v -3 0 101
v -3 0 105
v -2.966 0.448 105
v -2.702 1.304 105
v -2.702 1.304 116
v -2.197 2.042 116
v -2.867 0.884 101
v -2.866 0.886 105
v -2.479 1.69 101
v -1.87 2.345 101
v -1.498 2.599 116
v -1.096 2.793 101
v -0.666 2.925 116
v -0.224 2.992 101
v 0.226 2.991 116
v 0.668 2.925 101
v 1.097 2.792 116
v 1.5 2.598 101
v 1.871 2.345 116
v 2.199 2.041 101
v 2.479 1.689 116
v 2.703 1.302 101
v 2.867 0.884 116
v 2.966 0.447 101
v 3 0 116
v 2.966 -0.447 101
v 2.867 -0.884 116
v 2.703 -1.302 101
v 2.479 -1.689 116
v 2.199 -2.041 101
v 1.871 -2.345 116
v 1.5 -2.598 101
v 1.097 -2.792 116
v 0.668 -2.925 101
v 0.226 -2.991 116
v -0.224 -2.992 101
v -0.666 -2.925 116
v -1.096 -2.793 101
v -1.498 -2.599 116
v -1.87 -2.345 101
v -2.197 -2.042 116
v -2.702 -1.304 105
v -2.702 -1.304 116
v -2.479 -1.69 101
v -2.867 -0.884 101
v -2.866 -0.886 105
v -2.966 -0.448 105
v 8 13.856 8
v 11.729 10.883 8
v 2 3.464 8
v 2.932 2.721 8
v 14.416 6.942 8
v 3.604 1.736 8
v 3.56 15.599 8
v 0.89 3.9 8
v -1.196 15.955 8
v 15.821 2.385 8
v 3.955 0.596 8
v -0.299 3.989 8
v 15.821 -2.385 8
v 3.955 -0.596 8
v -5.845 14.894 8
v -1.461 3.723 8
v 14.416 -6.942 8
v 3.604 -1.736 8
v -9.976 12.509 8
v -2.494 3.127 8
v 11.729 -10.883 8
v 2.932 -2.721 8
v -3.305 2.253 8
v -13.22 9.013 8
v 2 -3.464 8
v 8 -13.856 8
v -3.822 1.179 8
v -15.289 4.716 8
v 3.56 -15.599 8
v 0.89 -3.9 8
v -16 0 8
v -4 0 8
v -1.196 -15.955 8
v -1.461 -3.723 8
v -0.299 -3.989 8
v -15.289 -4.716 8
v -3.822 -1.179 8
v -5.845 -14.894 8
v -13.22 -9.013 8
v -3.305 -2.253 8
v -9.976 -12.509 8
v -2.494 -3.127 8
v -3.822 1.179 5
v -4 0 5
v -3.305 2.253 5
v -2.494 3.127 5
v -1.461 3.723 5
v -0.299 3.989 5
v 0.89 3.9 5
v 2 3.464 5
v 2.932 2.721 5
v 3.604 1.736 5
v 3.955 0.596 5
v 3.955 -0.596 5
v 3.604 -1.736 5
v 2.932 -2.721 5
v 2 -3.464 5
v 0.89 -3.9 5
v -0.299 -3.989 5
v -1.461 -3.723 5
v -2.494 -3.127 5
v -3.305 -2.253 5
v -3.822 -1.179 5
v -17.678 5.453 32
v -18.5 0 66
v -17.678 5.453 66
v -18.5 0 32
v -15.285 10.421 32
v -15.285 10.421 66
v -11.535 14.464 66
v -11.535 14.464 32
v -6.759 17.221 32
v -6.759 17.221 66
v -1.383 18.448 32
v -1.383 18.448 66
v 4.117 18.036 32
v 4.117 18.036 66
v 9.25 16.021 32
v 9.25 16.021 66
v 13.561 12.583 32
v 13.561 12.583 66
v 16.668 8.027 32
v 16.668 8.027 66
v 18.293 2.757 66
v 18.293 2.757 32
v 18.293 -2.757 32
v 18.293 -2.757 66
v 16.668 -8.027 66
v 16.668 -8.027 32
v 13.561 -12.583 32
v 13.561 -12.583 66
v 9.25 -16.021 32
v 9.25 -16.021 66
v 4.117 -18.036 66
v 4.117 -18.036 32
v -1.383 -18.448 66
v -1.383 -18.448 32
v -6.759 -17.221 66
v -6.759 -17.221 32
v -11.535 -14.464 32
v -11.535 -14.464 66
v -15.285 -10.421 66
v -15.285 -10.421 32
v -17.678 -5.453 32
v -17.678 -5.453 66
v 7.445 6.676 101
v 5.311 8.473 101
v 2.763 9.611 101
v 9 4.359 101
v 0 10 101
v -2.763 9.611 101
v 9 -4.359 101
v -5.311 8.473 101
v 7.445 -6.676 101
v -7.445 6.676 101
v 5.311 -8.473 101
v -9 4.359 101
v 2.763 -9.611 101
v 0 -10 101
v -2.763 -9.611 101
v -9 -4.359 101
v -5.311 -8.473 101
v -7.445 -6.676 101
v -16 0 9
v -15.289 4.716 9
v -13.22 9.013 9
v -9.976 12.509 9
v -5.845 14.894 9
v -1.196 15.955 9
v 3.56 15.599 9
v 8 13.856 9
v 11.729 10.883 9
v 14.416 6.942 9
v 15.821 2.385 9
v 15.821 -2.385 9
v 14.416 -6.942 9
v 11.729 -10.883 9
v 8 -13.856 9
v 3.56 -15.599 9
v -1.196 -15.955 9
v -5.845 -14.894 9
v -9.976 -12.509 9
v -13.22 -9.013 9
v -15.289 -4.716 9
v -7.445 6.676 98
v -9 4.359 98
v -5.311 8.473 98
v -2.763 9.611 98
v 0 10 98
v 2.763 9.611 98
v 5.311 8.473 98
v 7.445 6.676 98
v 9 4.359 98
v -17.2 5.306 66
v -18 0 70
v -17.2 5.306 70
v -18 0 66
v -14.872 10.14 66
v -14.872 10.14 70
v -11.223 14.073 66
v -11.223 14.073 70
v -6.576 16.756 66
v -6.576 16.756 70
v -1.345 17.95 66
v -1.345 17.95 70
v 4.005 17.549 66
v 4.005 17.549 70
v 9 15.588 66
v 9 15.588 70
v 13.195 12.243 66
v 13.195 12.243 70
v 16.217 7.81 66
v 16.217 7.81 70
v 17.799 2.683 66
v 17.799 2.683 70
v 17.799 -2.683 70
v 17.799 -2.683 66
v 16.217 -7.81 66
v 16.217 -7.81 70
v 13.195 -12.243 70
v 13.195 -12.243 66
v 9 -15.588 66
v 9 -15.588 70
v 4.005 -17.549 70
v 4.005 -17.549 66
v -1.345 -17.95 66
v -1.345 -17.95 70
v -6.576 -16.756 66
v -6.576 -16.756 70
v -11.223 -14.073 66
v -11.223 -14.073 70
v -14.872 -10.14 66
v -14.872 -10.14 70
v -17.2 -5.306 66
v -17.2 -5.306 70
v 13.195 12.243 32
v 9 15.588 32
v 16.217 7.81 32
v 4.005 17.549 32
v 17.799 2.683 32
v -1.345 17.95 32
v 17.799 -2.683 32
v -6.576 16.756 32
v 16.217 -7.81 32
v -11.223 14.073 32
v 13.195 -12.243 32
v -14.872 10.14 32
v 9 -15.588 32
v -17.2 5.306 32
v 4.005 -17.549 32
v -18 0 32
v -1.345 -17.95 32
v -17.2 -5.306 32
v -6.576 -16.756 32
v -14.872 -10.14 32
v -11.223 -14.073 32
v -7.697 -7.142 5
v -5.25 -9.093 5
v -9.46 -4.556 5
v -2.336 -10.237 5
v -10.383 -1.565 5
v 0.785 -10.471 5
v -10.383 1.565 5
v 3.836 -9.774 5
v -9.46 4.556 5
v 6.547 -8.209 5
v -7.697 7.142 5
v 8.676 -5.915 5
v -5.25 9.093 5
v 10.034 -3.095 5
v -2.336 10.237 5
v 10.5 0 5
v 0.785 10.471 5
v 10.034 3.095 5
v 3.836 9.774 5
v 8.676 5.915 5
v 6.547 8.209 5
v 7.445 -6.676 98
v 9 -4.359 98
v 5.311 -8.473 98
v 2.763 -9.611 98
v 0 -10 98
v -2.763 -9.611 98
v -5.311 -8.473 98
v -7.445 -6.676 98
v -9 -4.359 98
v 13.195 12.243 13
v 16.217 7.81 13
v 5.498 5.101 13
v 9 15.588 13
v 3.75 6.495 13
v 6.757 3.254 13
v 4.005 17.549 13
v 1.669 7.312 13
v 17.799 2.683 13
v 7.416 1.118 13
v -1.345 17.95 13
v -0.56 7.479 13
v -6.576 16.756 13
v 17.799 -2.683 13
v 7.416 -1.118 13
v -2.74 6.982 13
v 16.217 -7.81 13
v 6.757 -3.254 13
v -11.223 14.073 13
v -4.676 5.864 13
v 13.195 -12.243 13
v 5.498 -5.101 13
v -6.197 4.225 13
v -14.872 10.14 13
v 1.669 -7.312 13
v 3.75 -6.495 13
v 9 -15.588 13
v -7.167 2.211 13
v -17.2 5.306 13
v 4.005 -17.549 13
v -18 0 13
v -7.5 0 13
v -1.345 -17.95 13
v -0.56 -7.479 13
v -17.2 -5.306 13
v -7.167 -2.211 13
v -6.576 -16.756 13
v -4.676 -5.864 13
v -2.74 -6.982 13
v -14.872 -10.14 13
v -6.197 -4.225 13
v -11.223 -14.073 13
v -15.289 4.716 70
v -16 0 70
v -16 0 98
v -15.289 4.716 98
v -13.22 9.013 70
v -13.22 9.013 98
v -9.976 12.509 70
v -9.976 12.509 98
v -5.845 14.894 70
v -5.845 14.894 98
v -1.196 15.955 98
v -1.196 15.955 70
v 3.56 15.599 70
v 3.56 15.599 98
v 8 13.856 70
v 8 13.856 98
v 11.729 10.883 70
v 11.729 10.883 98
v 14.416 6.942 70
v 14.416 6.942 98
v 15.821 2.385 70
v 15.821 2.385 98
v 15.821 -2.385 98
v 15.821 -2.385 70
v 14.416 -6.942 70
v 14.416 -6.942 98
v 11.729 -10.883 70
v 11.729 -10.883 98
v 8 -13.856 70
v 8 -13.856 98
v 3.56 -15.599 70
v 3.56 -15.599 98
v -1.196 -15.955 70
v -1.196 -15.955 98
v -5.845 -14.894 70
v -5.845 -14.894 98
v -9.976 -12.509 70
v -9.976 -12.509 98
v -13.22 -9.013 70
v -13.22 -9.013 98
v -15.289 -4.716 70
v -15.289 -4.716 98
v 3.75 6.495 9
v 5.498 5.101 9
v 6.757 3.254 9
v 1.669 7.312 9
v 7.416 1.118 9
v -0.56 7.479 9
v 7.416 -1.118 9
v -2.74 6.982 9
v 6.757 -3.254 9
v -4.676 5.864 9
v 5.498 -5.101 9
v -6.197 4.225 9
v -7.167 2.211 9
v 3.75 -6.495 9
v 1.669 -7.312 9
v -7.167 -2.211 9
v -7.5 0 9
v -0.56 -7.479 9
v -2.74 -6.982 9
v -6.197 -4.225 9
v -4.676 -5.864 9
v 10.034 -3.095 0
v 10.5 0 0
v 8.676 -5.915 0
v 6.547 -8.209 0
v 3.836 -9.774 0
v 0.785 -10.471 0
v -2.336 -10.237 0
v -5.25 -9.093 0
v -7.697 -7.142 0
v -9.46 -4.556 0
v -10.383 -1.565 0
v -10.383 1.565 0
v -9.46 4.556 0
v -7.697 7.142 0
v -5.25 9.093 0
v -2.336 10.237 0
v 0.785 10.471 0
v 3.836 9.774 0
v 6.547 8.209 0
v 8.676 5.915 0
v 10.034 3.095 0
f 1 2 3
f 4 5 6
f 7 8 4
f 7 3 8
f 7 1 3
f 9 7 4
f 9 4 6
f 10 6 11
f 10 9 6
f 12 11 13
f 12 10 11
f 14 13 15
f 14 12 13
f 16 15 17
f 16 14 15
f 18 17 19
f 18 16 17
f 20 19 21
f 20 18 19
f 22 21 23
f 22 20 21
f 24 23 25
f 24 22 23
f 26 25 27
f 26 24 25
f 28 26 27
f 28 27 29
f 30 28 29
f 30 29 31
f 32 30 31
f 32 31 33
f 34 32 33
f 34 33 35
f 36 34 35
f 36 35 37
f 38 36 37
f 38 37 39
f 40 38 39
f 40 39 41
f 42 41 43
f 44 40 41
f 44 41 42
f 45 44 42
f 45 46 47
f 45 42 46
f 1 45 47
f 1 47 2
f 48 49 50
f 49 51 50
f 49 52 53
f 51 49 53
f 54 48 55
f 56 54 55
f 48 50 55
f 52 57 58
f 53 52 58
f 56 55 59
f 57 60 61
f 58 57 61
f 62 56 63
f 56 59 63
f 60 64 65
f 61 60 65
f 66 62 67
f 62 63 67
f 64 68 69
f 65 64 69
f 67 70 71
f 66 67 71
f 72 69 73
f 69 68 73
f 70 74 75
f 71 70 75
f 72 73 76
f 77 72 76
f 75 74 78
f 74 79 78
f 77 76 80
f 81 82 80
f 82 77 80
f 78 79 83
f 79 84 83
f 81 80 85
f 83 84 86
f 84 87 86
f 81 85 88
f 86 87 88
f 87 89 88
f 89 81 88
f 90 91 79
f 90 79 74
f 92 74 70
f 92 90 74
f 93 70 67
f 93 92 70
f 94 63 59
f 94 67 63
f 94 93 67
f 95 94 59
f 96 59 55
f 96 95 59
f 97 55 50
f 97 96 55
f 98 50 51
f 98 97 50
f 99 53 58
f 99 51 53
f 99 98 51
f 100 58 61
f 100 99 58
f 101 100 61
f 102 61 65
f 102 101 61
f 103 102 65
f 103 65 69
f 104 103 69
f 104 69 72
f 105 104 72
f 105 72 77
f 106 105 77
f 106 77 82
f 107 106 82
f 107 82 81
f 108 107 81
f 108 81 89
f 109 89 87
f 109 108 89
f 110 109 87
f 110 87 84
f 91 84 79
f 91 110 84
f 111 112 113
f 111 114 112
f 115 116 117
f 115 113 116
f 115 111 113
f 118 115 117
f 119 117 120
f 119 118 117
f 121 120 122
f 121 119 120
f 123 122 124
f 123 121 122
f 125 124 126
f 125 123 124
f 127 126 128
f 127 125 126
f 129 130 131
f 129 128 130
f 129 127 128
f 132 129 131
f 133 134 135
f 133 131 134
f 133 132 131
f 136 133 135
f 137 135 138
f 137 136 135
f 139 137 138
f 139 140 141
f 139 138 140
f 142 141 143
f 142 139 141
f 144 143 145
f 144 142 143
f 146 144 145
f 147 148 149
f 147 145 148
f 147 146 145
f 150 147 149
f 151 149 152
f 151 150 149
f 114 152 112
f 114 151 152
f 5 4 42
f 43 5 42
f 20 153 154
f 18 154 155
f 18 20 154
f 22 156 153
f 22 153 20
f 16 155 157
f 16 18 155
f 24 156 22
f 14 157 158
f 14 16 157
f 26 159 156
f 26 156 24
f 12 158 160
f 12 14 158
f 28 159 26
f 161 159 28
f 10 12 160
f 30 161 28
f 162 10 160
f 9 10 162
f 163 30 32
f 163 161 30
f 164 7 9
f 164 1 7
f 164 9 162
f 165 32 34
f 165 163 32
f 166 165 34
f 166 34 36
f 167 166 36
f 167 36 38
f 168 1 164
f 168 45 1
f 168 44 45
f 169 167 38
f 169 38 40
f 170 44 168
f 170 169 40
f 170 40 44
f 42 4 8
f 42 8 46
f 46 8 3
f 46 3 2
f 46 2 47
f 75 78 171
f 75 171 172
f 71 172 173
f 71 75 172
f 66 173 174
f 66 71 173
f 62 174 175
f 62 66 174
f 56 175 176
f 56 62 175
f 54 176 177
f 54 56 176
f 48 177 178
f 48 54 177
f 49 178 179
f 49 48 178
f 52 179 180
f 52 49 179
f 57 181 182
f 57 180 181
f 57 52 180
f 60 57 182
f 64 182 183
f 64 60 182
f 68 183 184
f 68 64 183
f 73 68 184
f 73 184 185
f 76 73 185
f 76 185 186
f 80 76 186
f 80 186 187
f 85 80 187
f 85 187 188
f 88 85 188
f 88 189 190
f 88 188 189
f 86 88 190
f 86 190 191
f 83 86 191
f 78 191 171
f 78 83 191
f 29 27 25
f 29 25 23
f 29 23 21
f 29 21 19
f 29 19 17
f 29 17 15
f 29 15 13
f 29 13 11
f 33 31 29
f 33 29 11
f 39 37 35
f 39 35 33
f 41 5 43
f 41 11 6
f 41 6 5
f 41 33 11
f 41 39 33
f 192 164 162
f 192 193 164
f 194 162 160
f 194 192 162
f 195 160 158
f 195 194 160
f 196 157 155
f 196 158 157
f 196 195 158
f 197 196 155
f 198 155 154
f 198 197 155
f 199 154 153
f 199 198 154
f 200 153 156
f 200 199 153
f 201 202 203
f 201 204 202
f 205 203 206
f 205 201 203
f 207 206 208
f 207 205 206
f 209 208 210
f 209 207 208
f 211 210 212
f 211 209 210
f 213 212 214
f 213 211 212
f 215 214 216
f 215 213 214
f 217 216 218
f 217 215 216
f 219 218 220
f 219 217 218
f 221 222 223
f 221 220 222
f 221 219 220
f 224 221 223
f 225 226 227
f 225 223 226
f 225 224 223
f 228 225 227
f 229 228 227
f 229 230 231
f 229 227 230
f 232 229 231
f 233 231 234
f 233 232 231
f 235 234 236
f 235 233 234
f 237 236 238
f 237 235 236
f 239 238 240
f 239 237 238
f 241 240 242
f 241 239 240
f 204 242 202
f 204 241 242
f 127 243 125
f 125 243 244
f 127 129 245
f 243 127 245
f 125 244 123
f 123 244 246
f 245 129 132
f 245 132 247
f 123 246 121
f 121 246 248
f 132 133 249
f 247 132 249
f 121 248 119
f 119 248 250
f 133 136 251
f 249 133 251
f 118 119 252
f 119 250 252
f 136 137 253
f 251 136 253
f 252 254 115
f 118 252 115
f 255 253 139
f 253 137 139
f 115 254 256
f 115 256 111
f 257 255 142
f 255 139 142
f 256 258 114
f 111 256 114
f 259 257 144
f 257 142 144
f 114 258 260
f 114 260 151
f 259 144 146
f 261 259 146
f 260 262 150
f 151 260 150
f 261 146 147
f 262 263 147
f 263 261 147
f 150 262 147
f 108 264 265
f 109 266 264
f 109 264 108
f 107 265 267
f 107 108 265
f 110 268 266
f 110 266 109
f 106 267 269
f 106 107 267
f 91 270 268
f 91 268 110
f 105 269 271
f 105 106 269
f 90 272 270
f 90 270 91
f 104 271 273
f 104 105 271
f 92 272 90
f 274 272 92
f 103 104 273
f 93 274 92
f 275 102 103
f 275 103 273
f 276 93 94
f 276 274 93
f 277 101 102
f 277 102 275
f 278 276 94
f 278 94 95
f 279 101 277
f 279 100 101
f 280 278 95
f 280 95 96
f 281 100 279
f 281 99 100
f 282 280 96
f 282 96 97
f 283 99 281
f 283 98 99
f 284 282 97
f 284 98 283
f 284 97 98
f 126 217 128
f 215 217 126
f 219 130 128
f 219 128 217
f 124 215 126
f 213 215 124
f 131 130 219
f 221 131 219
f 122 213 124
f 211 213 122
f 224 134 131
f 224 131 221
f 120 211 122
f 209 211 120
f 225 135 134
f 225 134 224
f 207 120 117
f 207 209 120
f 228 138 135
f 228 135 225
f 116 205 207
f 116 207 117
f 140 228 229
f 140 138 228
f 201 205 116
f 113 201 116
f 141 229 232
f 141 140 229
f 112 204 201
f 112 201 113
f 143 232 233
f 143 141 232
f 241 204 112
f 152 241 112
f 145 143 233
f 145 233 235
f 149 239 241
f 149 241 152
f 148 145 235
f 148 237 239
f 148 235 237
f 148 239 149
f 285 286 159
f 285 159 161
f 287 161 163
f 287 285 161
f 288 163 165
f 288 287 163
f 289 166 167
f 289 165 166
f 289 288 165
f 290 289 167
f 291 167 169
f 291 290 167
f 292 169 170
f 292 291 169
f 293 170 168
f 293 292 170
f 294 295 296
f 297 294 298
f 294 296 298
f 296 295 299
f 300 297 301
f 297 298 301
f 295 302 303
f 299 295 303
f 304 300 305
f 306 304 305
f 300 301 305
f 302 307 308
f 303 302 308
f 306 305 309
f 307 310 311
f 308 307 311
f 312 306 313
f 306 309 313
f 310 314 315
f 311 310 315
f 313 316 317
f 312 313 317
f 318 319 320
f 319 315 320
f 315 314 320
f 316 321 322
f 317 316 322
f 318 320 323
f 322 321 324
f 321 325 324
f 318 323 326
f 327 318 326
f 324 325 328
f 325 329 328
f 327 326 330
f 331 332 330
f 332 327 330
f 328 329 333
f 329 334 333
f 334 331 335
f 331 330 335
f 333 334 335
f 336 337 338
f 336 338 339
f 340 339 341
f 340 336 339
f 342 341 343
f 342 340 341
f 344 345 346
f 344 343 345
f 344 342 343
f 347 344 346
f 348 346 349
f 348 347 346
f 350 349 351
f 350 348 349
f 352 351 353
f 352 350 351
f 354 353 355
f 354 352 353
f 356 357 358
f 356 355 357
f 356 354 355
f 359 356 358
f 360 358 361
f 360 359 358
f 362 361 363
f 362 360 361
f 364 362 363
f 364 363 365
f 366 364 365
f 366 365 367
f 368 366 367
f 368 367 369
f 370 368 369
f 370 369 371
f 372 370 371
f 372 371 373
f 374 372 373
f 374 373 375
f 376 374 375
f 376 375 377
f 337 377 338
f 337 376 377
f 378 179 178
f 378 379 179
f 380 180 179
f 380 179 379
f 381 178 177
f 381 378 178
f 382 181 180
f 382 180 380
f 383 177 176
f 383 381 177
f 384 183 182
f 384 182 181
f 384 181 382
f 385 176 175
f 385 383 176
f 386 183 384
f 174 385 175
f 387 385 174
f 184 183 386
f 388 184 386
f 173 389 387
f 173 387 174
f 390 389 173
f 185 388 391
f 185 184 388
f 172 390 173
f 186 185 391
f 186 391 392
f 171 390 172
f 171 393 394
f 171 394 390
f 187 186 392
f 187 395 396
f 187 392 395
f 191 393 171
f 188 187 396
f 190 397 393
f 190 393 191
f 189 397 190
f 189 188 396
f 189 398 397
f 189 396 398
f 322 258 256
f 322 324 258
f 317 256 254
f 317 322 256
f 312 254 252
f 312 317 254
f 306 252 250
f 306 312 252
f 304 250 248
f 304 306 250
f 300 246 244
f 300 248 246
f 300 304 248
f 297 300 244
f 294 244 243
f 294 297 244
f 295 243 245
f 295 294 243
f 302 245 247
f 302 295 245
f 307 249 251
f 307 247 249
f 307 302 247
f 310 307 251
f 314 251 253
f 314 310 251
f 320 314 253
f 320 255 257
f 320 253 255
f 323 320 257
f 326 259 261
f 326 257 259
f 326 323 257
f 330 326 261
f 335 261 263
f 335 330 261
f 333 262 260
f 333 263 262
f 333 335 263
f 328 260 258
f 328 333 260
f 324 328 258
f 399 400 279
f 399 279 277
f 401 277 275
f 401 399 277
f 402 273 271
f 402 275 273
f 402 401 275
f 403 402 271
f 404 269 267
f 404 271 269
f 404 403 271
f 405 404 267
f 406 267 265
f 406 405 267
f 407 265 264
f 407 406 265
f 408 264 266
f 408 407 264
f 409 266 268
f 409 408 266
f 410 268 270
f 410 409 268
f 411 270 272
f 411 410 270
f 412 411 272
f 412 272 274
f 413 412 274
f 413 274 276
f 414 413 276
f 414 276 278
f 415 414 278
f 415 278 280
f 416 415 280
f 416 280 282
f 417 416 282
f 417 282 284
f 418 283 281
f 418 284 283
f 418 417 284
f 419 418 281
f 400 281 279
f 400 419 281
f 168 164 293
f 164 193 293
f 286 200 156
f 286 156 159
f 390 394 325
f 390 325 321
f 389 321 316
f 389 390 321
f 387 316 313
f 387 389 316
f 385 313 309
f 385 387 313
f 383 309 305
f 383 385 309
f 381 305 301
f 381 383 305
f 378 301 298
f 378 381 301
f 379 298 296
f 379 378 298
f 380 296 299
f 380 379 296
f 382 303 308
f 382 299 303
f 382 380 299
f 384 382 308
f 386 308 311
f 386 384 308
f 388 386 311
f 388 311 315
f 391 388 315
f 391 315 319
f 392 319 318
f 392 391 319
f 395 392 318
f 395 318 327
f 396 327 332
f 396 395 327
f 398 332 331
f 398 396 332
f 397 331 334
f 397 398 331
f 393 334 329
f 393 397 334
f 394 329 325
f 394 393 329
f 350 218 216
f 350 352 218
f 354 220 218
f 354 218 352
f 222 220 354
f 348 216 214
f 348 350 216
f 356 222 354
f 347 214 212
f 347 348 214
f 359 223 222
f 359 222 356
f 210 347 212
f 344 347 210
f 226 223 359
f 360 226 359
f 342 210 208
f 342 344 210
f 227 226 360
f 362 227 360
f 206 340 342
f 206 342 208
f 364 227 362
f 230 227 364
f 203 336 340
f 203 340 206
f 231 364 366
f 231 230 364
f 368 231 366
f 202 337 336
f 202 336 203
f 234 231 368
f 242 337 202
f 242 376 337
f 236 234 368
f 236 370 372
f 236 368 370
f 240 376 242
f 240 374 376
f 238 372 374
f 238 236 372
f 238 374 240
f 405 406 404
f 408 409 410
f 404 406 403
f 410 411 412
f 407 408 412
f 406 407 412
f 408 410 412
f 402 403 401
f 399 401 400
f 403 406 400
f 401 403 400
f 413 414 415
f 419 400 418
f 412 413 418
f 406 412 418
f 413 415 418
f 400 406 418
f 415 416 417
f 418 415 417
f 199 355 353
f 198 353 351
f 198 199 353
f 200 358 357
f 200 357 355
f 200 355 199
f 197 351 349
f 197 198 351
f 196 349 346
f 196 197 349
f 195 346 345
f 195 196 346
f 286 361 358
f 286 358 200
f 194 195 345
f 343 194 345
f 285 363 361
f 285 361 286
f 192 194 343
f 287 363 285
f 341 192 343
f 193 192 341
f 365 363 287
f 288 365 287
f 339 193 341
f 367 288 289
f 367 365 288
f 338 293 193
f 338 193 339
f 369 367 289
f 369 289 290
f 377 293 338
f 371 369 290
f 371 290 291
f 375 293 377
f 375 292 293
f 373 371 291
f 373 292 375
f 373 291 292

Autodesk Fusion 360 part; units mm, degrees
sketch "Sketch1" plane through (0, 0, 0) normal (0, 0, 1) x (1, 0, 0)
  circle A0 centre (0, 0) radius 10.5
  dimension "d1" = 21
extrude "Extrude1" add sketch "Sketch1" along normal blind 5
sketch "Sketch2" plane through (0, 0, 5) normal (0, 0, 1) x (-1, 0, 0)
  circle A0 centre (0, 0) radius 10.5
  circle A1 centre (0, 0) radius 4
  dimension "d4" = 8
extrude "Extrude2" add sketch "Sketch2" along normal blind 3 contours A1
sketch "Sketch3" plane through (0, 0, 8) normal (0, 0, 1) x (-1, 0, 0)
  circle A0 centre (0, 0) radius 4
  circle A1 centre (0, 0) radius 16
  dimension "d7" = 32
extrude "Extrude3" add sketch "Sketch3" along normal blind 1 contours A0 | A1
sketch "Sketch4" plane through (0, 0, 9) normal (0, 0, 1) x (-1, 0, 0)
  circle A0 centre (0, 0) radius 16
  circle A1 centre (0, 0) radius 7.5
  dimension "d10" = 15
extrude "Extrude4" add sketch "Sketch4" along normal blind 4 contours A1
sketch "Sketch5" plane through (0, 0, 13) normal (0, 0, 1) x (-1, 0, 0)
  circle A0 centre (0, 0) radius 7.5
  circle A1 centre (0, 0) radius 18
  dimension "d13" = 36
extrude "Extrude5" add sketch "Sketch5" along normal blind 19 contours A0 | A1
sketch "Sketch6" plane through (0, 0, 32) normal (0, 0, 1) x (-1, 0, 0)
  circle A0 centre (0, 0) radius 18
  circle A1 centre (0, 0) radius 18.5
  dimension "d16" = 37
extrude "Extrude6" add sketch "Sketch6" along normal blind 34 contours A0 | A1
sketch "Sketch7" plane through (0, 0, 66) normal (0, 0, 1) x (-1, 0, 0)
  circle A0 centre (0, 0) radius 18.5
  circle A1 centre (0, 0) radius 18
  dimension "d19" = 36
extrude "Extrude7" add sketch "Sketch7" along normal blind 4 contours A1
sketch "Sketch8" plane through (0, 0, 70) normal (0, 0, 1) x (-1, 0, 0)
  circle A0 centre (0, 0) radius 18
  circle A1 centre (0, 0) radius 16
  dimension "d22" = 32
extrude "Extrude8" add sketch "Sketch8" along normal blind 28 contours A1
sketch "Sketch9" plane through (0, 0, 98) normal (0, 0, 1) x (-1, 0, 0)
  circle A0 centre (0, 0) radius 16
  line L0 (0, -10) -> (0, 10) construction
  line L1 (9, -4.3589) -> (9, 4.3589)
  line L2 (-9, -4.3589) -> (-9, 4.3589)
  arc A1 (9, 4.3589) -> (-9, 4.3589) centre (0, 0) ccw
  arc A2 (-9, -4.3589) -> (9, -4.3589) centre (0, 0) ccw
  dimension "d25" = 20
  dimension "d26" = 9
sketch "Sketch10" plane through (0, 0, 98) normal (0, 0, 1) x (-1, 0, 0)
extrude "Extrude9" add sketch "Sketch9" along normal blind 3 contours L1 L2 A1 A2
sketch "Sketch11" plane through (0, 0, 101) normal (0, 0, 1) x (-1, 0, 0)
  arc A0 (-9, -4.3589) -> (9, -4.3589) centre (0, 0) ccw
  line L0 (9, -4.3589) -> (9, 4.3589)
  arc A1 (9, 4.3589) -> (-9, 4.3589) centre (0, 0) ccw
  line L1 (-9, 4.3589) -> (-9, -4.3589)
  circle A2 centre (0, 0) radius 3
  dimension "d29" = 6
extrude "Extrude10" add sketch "Sketch11" along normal blind 4 contours A2
sketch "Sketch12" plane through (0, 0, 105) normal (0, 0, 1) x (-1, 0, 0)
  circle A0 centre (0, 0) radius 3
  line L0 (2.7017, -1.3042) -> (2.7017, 1.3042)
  arc A1 (2.7017, 1.3042) -> (2.7017, -1.3042) centre (0, 0) ccw
extrude "Extrude11" add sketch "Sketch12" along normal blind 11 contours A0 L0 A1
